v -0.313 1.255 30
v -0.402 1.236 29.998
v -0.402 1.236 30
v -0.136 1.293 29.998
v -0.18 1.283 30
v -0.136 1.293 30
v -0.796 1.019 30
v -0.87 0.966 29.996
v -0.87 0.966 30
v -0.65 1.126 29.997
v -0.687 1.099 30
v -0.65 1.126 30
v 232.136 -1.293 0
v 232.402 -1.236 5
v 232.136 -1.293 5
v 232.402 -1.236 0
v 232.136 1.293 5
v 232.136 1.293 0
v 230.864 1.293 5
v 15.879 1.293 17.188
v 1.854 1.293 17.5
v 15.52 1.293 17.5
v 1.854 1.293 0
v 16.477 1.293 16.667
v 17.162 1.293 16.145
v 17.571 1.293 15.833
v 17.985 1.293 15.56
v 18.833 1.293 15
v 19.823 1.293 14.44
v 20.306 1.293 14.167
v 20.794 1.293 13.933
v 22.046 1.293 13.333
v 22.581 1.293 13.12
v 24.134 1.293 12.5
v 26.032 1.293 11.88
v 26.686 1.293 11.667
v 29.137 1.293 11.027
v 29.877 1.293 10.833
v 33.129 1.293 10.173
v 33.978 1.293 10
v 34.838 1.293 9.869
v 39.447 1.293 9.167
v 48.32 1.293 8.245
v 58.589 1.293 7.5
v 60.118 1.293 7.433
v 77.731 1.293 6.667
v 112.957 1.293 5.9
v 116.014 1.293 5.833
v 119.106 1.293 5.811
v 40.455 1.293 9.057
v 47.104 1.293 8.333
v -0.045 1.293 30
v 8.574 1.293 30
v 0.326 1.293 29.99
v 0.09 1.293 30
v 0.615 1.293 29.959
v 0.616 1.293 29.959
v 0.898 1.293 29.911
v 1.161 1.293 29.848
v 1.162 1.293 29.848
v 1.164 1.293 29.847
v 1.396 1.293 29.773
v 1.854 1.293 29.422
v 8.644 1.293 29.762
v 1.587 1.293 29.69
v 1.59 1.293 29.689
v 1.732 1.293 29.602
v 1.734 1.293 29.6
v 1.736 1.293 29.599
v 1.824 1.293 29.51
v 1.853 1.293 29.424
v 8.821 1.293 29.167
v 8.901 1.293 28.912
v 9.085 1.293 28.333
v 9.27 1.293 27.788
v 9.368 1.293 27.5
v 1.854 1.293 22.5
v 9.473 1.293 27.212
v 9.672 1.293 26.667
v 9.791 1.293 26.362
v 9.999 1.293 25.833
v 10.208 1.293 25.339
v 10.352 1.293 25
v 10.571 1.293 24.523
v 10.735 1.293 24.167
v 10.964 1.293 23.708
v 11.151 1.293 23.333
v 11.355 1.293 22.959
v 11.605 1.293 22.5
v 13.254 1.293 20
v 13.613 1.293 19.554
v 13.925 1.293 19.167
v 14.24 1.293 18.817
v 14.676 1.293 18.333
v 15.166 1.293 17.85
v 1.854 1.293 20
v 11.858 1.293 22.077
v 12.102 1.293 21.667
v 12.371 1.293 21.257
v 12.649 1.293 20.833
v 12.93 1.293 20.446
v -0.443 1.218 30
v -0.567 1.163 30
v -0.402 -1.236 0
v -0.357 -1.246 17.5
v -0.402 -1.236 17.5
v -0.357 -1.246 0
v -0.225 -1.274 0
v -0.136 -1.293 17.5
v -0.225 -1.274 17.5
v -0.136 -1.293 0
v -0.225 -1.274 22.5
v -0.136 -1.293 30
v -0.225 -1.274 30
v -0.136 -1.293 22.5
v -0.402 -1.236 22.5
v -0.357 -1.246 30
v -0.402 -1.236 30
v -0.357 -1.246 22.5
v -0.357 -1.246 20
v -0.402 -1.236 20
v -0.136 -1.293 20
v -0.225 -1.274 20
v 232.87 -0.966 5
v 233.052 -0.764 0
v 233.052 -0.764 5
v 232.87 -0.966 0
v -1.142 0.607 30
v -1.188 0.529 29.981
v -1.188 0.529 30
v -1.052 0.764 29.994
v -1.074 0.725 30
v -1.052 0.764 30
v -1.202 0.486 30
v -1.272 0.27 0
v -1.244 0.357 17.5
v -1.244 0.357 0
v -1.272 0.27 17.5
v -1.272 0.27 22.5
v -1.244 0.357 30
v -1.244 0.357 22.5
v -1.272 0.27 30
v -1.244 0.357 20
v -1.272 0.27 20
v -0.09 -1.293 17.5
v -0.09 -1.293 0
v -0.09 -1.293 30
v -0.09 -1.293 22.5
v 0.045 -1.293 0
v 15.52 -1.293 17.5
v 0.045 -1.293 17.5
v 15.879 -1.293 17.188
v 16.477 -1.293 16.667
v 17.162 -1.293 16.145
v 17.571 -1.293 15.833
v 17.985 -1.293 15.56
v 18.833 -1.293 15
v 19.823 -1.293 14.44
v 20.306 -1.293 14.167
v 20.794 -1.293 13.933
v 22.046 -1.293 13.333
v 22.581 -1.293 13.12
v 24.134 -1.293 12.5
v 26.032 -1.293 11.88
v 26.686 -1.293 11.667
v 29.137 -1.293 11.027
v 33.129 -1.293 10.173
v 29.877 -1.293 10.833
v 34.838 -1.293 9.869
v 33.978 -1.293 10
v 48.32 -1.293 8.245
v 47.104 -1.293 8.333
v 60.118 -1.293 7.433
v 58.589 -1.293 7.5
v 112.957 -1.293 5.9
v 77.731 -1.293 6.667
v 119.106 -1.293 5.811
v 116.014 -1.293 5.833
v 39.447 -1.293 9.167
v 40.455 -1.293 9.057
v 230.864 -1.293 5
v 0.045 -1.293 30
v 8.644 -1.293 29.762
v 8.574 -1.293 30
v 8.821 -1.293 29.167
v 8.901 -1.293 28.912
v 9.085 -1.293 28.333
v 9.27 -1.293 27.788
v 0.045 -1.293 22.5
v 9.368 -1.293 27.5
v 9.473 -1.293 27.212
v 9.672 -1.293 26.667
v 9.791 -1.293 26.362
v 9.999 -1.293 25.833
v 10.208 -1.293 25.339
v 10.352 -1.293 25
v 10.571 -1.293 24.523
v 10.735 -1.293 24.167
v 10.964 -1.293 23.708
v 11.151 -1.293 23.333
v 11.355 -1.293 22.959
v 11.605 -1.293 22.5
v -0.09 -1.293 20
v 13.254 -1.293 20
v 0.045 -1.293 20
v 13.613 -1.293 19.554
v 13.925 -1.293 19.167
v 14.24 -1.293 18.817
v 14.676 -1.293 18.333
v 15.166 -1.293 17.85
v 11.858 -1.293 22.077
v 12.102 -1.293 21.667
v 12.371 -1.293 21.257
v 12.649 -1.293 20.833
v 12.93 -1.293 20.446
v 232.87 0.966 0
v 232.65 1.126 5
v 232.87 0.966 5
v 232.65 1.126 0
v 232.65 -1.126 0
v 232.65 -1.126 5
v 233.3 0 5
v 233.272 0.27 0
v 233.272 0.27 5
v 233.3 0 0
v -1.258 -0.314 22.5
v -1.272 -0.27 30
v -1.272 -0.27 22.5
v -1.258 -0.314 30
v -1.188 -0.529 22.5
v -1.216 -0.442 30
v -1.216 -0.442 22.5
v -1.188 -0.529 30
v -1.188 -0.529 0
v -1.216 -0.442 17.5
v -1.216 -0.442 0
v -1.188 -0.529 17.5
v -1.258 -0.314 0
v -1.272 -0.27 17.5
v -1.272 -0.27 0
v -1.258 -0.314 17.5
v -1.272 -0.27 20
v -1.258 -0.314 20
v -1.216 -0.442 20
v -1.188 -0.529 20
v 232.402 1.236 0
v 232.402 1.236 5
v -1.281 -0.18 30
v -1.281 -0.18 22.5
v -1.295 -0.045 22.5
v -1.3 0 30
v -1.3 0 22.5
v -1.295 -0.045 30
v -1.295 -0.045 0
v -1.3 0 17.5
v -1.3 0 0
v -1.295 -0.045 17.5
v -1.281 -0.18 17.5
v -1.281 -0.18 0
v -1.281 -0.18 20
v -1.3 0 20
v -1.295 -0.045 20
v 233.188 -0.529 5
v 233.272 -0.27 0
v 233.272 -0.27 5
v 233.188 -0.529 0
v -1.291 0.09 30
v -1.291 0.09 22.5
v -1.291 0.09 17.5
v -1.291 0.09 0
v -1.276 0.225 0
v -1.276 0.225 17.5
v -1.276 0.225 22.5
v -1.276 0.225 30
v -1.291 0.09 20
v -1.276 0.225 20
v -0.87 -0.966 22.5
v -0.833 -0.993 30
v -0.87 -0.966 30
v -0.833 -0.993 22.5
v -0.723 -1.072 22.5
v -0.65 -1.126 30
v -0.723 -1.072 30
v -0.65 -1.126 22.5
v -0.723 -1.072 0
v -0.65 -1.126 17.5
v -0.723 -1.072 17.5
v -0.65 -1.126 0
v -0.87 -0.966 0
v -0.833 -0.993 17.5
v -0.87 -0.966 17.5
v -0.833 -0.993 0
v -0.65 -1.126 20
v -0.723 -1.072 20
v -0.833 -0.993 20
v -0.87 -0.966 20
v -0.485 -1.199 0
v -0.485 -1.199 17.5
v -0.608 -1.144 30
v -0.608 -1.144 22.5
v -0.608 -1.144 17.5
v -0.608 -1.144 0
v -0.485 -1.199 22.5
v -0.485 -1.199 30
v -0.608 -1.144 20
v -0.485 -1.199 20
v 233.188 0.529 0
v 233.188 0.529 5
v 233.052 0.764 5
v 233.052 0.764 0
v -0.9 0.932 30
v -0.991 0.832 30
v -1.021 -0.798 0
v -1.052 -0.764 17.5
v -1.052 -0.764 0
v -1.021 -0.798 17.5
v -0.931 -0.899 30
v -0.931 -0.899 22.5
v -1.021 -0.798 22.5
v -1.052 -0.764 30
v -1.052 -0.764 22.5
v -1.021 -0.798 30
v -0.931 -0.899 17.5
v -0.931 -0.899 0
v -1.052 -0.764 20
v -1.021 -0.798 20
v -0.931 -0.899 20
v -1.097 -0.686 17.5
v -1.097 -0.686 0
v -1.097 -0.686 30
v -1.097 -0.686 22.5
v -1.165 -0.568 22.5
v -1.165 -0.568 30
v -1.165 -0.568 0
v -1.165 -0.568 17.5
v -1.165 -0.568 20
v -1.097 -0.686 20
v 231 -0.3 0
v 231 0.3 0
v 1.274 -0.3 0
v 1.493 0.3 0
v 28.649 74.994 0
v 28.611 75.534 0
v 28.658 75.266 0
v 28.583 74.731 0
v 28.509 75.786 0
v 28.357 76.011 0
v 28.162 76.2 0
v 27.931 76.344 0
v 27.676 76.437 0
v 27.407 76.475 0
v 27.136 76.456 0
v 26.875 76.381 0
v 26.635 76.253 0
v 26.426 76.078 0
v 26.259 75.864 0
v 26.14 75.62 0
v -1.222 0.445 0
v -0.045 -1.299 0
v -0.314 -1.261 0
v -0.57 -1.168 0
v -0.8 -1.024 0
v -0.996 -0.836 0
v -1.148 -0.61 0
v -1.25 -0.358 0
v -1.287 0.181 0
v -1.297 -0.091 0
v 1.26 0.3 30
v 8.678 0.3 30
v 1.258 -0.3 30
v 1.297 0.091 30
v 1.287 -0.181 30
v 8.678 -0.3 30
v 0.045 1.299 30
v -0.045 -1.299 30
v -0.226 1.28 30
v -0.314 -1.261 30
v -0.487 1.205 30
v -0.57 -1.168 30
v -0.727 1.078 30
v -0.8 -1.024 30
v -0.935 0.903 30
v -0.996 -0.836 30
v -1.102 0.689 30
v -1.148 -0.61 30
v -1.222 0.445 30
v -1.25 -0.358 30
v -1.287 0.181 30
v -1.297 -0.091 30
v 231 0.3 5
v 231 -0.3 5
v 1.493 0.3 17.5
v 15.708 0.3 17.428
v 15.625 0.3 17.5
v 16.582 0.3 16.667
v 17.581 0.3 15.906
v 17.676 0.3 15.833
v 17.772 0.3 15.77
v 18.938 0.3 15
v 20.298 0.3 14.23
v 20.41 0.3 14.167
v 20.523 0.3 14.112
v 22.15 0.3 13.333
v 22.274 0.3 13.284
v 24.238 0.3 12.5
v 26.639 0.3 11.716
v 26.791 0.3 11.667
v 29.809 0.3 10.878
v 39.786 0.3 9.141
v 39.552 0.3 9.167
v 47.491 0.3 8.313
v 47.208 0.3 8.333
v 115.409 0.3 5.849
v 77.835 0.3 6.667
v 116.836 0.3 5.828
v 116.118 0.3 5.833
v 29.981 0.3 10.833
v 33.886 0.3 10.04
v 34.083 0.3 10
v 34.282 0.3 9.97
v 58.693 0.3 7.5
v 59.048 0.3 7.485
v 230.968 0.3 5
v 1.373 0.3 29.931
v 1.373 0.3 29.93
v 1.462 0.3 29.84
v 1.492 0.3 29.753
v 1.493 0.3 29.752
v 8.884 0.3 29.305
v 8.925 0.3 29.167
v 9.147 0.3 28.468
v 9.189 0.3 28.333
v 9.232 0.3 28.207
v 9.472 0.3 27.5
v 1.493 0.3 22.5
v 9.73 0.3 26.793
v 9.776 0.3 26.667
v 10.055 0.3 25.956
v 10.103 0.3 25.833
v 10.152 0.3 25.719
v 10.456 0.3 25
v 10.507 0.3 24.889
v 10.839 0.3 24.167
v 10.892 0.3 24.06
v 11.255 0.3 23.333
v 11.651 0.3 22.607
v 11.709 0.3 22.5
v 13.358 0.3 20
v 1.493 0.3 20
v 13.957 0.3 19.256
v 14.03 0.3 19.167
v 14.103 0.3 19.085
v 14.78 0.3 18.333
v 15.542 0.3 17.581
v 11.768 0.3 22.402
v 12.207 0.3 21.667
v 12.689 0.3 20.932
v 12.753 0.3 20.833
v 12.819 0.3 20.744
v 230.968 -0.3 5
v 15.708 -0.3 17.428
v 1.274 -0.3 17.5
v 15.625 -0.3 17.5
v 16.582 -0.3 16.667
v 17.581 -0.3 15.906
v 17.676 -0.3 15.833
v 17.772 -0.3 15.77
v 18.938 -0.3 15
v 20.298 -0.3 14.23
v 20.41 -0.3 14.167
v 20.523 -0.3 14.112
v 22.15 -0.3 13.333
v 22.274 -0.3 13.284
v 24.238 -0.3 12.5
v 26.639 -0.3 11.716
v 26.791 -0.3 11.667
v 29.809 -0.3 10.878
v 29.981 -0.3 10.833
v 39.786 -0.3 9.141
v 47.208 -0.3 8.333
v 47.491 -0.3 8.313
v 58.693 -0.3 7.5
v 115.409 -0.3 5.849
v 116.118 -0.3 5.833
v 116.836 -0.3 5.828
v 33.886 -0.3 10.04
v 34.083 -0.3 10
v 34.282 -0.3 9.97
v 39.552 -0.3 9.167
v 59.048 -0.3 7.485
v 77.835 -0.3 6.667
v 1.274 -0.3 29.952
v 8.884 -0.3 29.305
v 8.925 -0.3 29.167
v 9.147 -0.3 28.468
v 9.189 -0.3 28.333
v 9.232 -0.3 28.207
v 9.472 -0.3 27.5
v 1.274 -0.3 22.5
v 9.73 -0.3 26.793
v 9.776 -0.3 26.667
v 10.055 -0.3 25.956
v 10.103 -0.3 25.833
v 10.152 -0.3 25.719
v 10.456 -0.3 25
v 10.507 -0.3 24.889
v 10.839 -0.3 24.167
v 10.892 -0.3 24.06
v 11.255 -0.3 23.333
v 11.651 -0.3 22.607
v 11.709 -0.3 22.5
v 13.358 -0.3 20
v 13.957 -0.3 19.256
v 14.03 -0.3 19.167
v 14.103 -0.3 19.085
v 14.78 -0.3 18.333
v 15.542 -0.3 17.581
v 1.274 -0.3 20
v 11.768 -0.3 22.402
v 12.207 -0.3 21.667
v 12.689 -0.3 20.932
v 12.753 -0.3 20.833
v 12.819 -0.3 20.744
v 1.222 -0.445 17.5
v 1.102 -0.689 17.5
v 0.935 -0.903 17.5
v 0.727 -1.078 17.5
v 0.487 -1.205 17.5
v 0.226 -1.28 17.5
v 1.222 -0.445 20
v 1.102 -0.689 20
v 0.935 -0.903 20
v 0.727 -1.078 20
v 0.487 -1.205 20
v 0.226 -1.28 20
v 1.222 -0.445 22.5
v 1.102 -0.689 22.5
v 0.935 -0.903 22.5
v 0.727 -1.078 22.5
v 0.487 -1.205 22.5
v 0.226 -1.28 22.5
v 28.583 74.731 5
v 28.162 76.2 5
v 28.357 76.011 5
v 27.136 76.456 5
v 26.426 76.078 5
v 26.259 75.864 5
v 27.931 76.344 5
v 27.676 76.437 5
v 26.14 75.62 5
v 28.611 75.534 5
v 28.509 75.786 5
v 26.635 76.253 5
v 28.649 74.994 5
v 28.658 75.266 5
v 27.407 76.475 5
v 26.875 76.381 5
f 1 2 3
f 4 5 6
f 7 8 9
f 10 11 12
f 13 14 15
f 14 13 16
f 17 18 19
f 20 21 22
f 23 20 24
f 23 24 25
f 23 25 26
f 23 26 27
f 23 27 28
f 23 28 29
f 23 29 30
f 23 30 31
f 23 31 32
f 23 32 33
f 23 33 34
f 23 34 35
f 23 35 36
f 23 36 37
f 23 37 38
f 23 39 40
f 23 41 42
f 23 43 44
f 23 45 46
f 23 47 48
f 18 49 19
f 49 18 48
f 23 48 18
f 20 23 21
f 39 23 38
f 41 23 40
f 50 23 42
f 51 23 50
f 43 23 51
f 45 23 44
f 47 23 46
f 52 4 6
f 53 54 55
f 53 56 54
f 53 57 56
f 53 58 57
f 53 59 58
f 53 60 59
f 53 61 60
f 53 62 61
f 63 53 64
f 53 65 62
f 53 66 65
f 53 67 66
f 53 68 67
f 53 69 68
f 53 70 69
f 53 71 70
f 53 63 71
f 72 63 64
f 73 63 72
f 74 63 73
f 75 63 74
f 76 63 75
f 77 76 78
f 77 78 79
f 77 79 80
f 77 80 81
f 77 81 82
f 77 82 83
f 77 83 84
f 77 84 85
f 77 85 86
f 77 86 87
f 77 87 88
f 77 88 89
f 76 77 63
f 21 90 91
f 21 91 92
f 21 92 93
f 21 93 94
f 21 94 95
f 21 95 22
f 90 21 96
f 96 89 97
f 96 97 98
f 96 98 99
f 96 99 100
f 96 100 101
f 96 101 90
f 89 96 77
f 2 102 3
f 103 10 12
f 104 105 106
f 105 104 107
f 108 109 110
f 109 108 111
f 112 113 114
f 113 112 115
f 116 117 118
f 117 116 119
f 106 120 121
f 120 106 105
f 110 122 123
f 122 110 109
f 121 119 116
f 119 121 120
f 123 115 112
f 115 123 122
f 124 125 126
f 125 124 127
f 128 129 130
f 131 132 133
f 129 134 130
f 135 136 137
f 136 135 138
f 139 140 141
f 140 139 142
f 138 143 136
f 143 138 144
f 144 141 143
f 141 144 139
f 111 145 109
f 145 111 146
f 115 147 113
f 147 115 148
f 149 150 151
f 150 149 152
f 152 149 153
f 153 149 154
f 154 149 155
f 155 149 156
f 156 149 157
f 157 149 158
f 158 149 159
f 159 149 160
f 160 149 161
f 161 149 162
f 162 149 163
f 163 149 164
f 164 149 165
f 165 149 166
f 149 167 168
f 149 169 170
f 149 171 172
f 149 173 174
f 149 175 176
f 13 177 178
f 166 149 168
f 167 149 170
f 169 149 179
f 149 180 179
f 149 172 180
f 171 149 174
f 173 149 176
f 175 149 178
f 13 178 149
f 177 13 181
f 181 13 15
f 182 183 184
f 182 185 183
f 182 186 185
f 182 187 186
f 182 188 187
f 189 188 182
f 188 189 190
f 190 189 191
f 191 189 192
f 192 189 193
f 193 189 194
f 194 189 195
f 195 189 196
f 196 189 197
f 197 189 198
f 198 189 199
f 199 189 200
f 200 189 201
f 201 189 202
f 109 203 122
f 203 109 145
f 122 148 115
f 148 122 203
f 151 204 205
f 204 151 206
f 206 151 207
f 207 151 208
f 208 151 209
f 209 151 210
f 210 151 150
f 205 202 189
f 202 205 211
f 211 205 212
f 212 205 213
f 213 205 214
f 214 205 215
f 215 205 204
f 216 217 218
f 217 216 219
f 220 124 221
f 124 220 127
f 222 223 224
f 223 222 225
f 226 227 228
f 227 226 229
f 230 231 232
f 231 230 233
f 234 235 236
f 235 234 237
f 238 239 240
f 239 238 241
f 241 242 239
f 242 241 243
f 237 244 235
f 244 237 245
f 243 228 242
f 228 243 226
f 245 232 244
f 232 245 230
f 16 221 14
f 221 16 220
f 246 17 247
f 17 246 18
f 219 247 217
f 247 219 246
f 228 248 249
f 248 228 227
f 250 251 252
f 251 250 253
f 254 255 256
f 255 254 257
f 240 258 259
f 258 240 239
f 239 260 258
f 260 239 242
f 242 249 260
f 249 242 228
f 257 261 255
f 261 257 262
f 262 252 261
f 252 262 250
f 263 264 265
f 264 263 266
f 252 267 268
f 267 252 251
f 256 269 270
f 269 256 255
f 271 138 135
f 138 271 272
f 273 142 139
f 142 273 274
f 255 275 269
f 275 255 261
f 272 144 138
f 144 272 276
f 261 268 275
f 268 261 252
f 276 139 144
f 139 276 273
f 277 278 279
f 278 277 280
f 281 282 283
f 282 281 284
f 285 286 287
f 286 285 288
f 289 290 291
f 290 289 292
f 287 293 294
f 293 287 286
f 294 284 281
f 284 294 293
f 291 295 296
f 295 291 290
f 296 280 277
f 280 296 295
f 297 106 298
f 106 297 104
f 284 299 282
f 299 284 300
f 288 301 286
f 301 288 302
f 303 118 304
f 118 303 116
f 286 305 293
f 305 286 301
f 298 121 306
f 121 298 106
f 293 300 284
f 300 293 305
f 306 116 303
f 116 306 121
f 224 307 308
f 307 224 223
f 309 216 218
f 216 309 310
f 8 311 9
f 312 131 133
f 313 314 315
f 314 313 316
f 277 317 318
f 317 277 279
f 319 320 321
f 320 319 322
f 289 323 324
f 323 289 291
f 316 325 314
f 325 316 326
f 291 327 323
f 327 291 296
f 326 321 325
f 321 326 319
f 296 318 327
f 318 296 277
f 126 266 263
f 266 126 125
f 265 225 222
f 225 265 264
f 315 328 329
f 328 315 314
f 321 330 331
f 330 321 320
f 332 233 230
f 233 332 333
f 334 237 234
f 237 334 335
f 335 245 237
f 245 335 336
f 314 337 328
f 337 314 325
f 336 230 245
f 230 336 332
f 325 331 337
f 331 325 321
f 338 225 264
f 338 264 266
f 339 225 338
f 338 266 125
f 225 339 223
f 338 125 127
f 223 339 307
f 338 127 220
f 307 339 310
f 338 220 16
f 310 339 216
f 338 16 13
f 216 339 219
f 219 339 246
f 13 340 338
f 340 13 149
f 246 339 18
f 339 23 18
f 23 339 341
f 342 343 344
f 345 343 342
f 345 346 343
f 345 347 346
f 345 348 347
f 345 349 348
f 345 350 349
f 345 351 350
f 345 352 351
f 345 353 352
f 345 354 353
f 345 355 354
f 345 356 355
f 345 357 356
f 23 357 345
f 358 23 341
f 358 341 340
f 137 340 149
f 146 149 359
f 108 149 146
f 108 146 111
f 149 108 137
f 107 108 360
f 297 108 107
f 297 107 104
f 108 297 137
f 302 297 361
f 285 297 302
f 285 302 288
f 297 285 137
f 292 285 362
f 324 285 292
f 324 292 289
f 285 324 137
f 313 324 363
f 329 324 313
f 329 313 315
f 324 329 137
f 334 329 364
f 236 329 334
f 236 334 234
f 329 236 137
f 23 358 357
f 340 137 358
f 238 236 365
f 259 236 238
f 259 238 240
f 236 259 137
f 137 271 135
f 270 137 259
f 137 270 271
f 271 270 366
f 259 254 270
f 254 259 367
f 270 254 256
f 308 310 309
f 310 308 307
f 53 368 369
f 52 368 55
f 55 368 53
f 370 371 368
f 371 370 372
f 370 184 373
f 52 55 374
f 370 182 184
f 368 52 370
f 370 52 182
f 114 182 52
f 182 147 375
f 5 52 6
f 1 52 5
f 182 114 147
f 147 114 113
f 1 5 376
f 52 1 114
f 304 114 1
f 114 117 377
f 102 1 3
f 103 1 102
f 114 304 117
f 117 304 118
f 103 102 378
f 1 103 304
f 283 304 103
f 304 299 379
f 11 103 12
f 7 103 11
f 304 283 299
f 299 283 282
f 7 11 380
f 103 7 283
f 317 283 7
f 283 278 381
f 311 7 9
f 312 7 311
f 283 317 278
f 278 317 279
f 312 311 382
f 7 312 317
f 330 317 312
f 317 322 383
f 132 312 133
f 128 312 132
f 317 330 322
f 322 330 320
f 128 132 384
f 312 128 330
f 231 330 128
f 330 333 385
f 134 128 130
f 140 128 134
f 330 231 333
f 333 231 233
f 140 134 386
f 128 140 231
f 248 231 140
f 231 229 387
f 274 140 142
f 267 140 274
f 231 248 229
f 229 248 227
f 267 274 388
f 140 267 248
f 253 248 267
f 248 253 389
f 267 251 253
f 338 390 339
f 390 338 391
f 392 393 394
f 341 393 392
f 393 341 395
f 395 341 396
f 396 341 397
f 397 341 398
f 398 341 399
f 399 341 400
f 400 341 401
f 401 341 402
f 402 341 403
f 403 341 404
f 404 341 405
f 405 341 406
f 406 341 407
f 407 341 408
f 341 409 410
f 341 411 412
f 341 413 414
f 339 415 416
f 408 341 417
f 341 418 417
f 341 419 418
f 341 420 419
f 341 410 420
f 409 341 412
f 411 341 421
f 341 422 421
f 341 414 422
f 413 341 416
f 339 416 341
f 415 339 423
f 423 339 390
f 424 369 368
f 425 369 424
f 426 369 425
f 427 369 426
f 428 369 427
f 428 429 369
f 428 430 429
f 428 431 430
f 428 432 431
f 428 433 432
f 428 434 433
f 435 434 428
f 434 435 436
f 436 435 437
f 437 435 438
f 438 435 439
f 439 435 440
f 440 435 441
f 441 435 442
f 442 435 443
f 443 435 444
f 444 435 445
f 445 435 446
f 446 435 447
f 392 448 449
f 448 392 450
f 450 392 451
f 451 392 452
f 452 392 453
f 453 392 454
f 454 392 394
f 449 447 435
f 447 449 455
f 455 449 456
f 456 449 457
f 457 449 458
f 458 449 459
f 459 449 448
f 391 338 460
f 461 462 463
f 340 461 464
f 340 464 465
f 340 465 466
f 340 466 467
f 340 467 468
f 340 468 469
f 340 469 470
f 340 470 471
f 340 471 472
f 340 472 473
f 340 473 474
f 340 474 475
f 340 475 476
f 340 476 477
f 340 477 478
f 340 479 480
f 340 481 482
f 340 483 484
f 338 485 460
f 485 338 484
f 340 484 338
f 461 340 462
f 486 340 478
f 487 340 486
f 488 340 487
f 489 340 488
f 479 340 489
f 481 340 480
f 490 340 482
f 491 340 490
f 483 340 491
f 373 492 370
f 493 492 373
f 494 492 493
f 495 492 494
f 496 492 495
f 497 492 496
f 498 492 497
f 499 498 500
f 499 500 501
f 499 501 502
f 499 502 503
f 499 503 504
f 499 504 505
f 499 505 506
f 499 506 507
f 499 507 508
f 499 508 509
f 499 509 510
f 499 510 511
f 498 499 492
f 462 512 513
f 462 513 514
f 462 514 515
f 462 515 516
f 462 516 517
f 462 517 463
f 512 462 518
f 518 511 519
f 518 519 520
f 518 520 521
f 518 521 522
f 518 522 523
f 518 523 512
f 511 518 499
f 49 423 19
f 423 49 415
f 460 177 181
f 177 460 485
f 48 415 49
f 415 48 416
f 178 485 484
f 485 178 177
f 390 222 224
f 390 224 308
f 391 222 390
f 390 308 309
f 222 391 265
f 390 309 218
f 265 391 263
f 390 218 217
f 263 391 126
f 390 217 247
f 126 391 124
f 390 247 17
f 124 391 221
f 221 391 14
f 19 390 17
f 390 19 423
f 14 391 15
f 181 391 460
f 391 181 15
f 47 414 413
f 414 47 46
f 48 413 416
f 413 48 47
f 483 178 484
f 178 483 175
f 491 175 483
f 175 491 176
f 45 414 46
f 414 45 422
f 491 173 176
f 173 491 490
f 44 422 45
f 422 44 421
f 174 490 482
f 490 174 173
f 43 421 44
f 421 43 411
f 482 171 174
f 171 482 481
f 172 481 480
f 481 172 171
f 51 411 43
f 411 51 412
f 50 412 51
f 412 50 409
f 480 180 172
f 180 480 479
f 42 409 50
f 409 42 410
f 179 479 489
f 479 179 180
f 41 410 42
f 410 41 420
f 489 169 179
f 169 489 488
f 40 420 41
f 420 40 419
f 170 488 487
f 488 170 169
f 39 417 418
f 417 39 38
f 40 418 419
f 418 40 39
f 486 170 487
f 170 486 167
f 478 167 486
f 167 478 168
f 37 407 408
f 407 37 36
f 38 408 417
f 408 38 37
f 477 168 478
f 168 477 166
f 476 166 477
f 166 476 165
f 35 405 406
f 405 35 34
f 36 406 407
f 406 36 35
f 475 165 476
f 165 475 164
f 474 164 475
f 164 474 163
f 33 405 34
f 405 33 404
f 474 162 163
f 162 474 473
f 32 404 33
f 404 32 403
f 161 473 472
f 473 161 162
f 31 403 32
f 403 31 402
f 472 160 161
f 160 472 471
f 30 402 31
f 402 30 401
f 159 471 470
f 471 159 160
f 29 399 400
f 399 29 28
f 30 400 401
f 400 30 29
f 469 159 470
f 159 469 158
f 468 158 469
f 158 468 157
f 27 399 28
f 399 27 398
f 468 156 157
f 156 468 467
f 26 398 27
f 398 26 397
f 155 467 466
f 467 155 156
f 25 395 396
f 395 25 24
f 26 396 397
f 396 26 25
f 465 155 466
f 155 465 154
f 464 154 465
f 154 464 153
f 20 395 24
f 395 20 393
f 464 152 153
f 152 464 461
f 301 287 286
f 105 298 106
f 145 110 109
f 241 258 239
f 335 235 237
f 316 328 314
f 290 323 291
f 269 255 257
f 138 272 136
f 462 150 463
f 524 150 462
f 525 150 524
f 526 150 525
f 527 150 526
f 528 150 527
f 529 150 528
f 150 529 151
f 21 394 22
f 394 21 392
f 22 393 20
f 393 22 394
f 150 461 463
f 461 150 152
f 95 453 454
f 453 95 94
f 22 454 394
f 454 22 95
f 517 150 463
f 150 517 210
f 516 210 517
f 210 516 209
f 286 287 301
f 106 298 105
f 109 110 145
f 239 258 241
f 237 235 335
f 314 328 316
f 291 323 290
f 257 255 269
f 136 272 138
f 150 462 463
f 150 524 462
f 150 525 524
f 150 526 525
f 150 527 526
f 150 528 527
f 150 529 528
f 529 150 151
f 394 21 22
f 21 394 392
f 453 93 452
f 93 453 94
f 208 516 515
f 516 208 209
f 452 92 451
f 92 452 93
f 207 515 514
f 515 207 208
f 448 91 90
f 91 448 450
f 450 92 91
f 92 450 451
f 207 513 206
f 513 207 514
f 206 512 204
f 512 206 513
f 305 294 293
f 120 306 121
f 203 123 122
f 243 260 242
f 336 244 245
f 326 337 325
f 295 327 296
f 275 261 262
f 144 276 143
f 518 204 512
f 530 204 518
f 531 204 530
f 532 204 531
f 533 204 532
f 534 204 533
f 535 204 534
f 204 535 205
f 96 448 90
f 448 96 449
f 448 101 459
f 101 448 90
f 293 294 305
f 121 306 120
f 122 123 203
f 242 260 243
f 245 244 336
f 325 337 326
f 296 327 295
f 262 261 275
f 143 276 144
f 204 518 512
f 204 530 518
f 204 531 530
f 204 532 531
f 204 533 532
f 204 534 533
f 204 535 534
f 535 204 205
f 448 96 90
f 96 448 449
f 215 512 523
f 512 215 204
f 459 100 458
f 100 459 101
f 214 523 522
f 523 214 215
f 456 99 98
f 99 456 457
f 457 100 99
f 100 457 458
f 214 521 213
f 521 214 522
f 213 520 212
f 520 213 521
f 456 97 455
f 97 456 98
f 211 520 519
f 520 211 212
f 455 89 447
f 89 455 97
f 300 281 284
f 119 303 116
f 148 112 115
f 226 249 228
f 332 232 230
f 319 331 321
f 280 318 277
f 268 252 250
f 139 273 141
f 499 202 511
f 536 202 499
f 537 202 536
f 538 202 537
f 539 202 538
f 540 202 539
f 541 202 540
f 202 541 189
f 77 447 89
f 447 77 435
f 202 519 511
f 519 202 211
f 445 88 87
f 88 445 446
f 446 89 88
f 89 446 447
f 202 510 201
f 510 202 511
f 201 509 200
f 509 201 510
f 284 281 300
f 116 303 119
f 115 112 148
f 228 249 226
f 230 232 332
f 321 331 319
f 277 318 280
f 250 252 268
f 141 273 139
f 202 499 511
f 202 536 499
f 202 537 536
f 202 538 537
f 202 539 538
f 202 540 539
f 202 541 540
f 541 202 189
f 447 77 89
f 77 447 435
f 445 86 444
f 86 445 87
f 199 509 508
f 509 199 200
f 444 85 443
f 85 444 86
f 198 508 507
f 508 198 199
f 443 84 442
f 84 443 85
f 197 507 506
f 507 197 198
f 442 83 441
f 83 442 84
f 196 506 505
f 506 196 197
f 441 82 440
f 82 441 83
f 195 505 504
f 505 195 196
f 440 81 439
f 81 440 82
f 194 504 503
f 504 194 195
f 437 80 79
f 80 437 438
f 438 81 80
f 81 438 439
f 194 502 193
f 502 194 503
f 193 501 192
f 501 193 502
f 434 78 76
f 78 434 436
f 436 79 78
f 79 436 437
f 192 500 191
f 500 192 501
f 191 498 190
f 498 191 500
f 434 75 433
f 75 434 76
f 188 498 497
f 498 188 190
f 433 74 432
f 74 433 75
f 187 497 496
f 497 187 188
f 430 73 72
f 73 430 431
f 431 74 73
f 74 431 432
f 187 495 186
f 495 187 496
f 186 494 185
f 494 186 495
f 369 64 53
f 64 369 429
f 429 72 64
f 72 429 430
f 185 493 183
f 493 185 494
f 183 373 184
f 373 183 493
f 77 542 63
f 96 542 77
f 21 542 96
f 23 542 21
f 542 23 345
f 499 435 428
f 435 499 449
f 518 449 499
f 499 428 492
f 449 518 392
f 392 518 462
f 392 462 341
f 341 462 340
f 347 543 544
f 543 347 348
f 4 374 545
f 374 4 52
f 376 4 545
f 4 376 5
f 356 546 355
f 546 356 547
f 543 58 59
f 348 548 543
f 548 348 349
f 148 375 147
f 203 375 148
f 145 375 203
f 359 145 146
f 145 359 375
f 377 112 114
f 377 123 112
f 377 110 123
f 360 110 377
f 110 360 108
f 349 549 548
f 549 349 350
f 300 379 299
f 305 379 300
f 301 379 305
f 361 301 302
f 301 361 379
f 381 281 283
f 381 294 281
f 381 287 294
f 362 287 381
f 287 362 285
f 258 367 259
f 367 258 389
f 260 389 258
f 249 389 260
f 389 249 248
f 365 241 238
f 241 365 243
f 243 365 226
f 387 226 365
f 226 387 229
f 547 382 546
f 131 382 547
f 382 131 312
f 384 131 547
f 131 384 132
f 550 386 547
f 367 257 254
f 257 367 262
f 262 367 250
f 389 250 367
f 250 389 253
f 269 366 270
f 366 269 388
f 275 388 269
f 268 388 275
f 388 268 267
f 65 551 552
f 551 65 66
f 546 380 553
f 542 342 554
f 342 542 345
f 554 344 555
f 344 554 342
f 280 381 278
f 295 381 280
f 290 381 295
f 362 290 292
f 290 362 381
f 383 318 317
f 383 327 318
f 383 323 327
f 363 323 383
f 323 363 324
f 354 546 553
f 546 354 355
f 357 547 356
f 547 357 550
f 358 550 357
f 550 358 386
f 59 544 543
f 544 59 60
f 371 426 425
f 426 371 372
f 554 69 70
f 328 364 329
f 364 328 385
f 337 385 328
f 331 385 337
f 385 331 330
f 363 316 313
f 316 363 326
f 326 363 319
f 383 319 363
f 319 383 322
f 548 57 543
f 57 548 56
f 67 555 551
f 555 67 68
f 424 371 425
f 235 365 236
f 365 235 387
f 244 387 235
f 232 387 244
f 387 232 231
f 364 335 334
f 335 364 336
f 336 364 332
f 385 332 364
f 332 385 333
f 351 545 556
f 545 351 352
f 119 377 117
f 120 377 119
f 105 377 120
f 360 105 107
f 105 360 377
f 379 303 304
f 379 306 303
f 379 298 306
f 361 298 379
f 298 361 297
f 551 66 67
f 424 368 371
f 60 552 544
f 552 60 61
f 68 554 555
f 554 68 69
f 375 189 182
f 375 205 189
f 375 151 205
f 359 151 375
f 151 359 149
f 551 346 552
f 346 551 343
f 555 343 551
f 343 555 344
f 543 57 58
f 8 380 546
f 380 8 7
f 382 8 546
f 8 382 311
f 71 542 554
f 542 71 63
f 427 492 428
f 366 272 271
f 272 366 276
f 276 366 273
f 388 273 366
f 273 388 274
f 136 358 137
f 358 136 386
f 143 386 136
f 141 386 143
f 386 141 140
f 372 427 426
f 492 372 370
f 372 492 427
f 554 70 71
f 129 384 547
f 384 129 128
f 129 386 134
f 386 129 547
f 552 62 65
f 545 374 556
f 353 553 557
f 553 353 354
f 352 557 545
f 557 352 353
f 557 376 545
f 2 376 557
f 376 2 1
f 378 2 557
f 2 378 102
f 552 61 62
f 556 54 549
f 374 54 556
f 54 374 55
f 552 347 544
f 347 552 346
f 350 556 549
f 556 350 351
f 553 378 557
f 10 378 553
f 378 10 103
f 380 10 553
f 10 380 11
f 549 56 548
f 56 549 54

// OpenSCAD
paper_thickness = 0.6;
thickness = 1;
paper_height = 230;
max_width = 30;
min_width = 5;
stand_angle = 20;
stand_length = 80;

$fn = 30;
$fs = 0.3;
$fa = 1;

intersection() {
	difference() {
		hull() {
			cylinder(r=thickness + paper_thickness / 2, h=max_width);
			translate([thickness * 2 + paper_height, 0, 0]) {
				cylinder(r=thickness + paper_thickness / 2, h=max_width);
			}
		}
		translate([thickness, -paper_thickness / 2, -1]) {
			cube([paper_height, paper_thickness, max_width + 2]);
		}
	}
	union() {
		hull() { //Base height of min_width.
			cylinder(r=thickness + paper_thickness / 2, h=min_width);
			translate([thickness * 2 + paper_height, 0, 0]) {
				cylinder(r=thickness + paper_thickness / 2, h=min_width);
			}
		}
		//The curve is a stack of cones.
		curve_width = paper_height + thickness;
		for(i = [1:$fn]) {
			frac_lower = 1 / (i / $fn) / $fn;
			frac_higher = 1 / ((i + 1) / $fn) / $fn;
			translate([0, 0, min_width + (i - 1) / $fn * (max_width - min_width)]) {
				cylinder(r1=(thickness + paper_thickness / 2) * (1 - frac_lower) + curve_width * frac_lower, r2=(thickness + paper_thickness / 2) * (1 - frac_higher) + curve_width * frac_higher, h=(max_width - min_width) / $fn);
			}
		}
	}
}

rotate([0, 0, -stand_angle]) {
	hull() {
		cylinder(r=thickness + paper_thickness / 2, h=max_width);
		translate([0, stand_length, 0]) {
			cylinder(r=thickness + paper_thickness / 2, h=min_width);
		}
	}
}
